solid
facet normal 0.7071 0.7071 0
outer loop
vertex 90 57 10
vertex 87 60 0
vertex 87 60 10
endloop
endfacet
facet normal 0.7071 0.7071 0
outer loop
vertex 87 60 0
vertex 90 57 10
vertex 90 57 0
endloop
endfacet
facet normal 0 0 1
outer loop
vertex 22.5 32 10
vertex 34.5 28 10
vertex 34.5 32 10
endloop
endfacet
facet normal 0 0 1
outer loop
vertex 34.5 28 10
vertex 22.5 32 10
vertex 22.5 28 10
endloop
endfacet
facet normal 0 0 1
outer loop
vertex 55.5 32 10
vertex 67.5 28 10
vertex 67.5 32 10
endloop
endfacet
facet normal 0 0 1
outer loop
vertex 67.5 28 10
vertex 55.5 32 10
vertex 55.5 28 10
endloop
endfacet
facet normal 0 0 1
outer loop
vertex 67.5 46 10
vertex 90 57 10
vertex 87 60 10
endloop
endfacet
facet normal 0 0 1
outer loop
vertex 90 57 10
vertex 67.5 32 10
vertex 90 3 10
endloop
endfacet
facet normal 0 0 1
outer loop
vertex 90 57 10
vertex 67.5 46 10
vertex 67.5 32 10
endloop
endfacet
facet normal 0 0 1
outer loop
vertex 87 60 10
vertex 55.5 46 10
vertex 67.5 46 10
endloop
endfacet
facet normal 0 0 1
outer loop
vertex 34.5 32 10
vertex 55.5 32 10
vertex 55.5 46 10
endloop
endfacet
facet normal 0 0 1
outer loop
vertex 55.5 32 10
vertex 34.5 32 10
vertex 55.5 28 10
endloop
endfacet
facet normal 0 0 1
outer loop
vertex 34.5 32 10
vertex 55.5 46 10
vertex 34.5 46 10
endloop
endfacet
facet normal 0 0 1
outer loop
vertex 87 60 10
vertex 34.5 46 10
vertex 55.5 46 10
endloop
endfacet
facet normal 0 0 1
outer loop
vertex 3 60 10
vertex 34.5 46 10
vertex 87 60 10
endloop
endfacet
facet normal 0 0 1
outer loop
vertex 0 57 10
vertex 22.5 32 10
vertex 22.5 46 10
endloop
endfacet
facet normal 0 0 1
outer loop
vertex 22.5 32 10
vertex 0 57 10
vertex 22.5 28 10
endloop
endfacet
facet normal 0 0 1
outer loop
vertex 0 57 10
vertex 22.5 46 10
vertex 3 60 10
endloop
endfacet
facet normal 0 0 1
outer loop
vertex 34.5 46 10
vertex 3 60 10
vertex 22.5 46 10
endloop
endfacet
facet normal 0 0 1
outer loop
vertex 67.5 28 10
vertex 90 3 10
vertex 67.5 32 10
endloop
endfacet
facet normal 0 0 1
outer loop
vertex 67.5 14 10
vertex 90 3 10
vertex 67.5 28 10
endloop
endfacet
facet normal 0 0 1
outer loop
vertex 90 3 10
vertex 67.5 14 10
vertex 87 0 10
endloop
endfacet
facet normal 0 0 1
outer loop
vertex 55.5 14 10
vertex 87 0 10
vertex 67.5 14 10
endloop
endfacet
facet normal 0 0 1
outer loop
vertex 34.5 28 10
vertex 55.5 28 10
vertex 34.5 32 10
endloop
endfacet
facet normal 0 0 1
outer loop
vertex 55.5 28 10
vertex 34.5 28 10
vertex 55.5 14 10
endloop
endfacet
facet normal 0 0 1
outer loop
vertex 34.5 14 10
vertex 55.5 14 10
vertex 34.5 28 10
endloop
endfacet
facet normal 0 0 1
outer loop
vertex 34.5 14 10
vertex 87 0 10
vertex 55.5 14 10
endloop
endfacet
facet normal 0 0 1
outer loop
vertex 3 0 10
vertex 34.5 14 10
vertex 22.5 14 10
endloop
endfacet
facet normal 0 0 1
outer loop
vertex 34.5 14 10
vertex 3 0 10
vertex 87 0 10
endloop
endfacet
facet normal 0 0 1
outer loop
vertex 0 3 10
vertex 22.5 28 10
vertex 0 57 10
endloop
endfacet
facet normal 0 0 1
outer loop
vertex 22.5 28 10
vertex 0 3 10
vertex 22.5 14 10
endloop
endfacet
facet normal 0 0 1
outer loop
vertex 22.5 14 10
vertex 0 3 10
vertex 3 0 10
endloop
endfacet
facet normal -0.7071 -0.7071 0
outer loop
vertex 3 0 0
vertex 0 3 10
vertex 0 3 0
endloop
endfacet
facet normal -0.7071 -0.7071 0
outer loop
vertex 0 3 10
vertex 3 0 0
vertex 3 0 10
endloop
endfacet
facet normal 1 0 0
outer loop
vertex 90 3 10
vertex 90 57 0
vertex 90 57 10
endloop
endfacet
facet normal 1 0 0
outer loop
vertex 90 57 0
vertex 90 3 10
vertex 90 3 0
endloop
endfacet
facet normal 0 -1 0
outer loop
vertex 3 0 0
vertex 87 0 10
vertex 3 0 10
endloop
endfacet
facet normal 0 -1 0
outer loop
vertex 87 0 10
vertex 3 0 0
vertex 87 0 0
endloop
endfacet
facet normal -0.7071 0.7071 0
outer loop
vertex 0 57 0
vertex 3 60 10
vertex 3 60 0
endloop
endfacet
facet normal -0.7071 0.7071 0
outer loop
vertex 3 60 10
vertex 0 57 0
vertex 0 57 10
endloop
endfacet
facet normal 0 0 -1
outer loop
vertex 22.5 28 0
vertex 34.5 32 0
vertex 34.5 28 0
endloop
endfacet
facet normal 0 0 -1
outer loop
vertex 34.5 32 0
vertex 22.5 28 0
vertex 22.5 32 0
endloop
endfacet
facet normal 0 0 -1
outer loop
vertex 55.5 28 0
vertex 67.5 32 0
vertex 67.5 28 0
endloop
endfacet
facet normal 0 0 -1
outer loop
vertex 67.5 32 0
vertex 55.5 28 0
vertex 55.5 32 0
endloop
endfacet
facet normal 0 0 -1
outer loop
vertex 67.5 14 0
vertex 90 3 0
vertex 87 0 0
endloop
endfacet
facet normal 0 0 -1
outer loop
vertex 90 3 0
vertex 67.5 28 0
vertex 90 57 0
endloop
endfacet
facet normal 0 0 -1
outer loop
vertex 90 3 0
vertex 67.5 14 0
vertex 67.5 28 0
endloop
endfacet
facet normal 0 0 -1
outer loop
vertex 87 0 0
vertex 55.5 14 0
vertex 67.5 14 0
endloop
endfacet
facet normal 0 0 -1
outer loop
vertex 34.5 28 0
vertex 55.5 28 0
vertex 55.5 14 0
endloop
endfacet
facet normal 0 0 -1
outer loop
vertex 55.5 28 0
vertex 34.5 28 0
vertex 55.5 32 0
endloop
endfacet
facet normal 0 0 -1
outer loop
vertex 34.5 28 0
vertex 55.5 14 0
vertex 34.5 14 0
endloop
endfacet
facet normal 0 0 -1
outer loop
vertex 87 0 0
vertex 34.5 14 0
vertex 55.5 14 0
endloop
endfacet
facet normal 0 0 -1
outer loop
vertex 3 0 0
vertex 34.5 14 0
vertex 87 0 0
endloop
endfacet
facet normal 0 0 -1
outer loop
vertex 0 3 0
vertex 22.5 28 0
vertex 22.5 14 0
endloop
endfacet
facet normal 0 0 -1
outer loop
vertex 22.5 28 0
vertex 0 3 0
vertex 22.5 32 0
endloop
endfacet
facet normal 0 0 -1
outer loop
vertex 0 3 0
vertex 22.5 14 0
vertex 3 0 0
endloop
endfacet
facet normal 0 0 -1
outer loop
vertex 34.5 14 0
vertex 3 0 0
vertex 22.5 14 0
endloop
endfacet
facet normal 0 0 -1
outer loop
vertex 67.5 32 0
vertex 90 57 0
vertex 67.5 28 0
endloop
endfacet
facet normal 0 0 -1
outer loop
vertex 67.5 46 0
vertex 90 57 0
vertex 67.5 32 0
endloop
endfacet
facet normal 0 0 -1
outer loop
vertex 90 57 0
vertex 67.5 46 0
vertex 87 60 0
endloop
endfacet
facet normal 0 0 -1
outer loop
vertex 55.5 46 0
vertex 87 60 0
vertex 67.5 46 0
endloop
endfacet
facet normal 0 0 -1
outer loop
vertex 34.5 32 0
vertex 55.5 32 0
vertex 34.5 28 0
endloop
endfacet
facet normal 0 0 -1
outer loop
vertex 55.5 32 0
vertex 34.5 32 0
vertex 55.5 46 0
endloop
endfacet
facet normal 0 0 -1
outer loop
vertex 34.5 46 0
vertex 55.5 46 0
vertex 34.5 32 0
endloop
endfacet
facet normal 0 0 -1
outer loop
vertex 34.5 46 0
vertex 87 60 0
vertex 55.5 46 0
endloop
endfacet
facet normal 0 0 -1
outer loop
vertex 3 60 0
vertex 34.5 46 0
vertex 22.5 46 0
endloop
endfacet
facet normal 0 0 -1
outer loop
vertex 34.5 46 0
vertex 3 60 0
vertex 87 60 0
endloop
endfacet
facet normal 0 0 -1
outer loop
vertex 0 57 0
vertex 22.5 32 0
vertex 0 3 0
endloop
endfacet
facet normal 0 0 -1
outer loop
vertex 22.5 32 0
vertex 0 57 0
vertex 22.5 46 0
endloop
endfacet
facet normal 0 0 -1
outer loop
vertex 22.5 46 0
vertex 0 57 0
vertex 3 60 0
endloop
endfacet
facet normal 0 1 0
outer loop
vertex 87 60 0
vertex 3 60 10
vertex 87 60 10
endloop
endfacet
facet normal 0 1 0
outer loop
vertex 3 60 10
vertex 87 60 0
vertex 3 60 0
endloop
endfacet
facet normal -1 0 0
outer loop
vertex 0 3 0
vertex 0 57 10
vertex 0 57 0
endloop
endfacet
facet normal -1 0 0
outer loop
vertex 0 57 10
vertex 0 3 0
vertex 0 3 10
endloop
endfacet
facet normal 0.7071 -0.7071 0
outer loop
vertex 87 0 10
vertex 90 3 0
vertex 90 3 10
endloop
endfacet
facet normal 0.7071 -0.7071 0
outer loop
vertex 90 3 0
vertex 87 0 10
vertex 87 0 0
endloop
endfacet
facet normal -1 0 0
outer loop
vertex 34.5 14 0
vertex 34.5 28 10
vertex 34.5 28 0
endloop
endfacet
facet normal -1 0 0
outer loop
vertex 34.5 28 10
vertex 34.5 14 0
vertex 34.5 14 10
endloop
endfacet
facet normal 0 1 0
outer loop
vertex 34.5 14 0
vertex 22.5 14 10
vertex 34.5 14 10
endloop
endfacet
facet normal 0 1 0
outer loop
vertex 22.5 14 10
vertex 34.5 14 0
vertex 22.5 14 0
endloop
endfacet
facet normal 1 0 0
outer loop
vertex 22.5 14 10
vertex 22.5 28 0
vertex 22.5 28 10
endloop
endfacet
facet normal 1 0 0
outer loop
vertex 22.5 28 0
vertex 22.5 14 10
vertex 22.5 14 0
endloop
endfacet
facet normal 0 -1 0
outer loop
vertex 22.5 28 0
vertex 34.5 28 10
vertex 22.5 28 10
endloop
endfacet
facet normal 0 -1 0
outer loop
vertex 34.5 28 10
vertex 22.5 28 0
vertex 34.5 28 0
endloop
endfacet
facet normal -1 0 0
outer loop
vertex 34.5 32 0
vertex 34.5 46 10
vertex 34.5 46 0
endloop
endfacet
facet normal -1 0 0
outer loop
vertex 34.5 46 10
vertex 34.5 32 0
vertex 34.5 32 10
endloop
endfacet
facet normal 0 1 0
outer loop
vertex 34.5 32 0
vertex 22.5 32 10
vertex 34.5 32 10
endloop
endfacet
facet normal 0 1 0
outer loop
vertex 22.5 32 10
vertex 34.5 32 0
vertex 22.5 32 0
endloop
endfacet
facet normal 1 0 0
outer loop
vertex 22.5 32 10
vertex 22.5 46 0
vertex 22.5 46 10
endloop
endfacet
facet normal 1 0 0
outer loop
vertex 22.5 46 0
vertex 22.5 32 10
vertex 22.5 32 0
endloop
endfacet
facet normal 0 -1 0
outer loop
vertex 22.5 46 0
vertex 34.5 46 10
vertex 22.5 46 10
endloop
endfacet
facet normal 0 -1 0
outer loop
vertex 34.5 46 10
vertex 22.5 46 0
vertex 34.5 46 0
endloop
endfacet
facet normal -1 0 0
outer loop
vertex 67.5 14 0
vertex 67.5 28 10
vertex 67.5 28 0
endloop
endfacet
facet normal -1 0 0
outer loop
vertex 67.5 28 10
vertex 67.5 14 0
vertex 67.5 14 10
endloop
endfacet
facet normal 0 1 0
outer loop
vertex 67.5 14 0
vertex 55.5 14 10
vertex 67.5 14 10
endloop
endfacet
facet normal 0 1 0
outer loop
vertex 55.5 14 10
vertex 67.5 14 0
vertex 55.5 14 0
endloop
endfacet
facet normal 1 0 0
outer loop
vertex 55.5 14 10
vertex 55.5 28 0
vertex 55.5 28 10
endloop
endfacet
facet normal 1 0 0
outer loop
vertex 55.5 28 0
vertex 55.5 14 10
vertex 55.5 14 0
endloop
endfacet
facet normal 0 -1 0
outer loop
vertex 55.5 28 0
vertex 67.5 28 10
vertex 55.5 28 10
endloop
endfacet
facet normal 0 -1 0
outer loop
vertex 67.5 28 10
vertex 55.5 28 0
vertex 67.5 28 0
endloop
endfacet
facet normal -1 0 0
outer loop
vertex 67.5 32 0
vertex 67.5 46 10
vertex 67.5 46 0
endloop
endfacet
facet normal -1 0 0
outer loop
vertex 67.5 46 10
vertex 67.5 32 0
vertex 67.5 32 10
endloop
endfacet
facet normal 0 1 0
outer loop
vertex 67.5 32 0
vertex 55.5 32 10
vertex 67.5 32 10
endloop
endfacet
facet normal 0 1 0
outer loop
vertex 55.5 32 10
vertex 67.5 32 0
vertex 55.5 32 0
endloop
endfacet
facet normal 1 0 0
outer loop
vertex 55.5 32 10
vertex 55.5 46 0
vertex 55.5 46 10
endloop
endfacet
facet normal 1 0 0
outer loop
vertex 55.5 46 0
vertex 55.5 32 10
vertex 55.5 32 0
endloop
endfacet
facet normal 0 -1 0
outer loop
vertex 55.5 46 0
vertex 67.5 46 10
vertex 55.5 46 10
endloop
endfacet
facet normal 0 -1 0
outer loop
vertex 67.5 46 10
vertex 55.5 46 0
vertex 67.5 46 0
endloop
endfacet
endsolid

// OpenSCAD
$fn = 32;

// ----------------------------------------------------------------------
// Windowed plate: 4 voids, 90 x 60 x 10 mm
// ----------------------------------------------------------------------

// --- parameters (mm) ---
plate_l = 90;             // plate length, X
plate_w = 60;             // plate width, Y
plate_t = 10;             // plate thickness, Z
edge_margin = 12;         // wall from the plate edge to any window
win_l = 12;               // pocket length
win_w = 14;               // pocket width
pitch_x = 33;             // grid pitch along X
pitch_y = 18;             // grid pitch along Y
depth_1 = 10;             // depth of void 1 (full thickness = through)
depth_2 = 10;             // depth of void 2 (full thickness = through)
depth_3 = 10;             // depth of void 3 (full thickness = through)
depth_4 = 10;             // depth of void 4 (full thickness = through)
corner_c = 3;             // corner chamfer of the plate

profile = [[3, 0], [87, 0], [90, 3], [90, 57], [87, 60], [3, 60], [0, 57], [0, 3]];  // primary outline, 8 points, counter clockwise
void_1 = [[22.5, 14], [34.5, 14], [34.5, 28], [22.5, 28]];  // pocket at grid node 0,0, 4 points
void_2 = [[22.5, 32], [34.5, 32], [34.5, 46], [22.5, 46]];  // pocket at grid node 0,1, 4 points
void_3 = [[55.5, 14], [67.5, 14], [67.5, 28], [55.5, 28]];  // pocket at grid node 1,0, 4 points
void_4 = [[55.5, 32], [67.5, 32], [67.5, 46], [55.5, 46]];  // pocket at grid node 1,1, 4 points

// --- the one profile operation ---
difference() {
  linear_extrude(height = plate_t) polygon(points = profile);
  translate([0, 0, -1])
    linear_extrude(height = plate_t + 2) polygon(points = void_1);
  translate([0, 0, -1])
    linear_extrude(height = plate_t + 2) polygon(points = void_2);
  translate([0, 0, -1])
    linear_extrude(height = plate_t + 2) polygon(points = void_3);
  translate([0, 0, -1])
    linear_extrude(height = plate_t + 2) polygon(points = void_4);
}
